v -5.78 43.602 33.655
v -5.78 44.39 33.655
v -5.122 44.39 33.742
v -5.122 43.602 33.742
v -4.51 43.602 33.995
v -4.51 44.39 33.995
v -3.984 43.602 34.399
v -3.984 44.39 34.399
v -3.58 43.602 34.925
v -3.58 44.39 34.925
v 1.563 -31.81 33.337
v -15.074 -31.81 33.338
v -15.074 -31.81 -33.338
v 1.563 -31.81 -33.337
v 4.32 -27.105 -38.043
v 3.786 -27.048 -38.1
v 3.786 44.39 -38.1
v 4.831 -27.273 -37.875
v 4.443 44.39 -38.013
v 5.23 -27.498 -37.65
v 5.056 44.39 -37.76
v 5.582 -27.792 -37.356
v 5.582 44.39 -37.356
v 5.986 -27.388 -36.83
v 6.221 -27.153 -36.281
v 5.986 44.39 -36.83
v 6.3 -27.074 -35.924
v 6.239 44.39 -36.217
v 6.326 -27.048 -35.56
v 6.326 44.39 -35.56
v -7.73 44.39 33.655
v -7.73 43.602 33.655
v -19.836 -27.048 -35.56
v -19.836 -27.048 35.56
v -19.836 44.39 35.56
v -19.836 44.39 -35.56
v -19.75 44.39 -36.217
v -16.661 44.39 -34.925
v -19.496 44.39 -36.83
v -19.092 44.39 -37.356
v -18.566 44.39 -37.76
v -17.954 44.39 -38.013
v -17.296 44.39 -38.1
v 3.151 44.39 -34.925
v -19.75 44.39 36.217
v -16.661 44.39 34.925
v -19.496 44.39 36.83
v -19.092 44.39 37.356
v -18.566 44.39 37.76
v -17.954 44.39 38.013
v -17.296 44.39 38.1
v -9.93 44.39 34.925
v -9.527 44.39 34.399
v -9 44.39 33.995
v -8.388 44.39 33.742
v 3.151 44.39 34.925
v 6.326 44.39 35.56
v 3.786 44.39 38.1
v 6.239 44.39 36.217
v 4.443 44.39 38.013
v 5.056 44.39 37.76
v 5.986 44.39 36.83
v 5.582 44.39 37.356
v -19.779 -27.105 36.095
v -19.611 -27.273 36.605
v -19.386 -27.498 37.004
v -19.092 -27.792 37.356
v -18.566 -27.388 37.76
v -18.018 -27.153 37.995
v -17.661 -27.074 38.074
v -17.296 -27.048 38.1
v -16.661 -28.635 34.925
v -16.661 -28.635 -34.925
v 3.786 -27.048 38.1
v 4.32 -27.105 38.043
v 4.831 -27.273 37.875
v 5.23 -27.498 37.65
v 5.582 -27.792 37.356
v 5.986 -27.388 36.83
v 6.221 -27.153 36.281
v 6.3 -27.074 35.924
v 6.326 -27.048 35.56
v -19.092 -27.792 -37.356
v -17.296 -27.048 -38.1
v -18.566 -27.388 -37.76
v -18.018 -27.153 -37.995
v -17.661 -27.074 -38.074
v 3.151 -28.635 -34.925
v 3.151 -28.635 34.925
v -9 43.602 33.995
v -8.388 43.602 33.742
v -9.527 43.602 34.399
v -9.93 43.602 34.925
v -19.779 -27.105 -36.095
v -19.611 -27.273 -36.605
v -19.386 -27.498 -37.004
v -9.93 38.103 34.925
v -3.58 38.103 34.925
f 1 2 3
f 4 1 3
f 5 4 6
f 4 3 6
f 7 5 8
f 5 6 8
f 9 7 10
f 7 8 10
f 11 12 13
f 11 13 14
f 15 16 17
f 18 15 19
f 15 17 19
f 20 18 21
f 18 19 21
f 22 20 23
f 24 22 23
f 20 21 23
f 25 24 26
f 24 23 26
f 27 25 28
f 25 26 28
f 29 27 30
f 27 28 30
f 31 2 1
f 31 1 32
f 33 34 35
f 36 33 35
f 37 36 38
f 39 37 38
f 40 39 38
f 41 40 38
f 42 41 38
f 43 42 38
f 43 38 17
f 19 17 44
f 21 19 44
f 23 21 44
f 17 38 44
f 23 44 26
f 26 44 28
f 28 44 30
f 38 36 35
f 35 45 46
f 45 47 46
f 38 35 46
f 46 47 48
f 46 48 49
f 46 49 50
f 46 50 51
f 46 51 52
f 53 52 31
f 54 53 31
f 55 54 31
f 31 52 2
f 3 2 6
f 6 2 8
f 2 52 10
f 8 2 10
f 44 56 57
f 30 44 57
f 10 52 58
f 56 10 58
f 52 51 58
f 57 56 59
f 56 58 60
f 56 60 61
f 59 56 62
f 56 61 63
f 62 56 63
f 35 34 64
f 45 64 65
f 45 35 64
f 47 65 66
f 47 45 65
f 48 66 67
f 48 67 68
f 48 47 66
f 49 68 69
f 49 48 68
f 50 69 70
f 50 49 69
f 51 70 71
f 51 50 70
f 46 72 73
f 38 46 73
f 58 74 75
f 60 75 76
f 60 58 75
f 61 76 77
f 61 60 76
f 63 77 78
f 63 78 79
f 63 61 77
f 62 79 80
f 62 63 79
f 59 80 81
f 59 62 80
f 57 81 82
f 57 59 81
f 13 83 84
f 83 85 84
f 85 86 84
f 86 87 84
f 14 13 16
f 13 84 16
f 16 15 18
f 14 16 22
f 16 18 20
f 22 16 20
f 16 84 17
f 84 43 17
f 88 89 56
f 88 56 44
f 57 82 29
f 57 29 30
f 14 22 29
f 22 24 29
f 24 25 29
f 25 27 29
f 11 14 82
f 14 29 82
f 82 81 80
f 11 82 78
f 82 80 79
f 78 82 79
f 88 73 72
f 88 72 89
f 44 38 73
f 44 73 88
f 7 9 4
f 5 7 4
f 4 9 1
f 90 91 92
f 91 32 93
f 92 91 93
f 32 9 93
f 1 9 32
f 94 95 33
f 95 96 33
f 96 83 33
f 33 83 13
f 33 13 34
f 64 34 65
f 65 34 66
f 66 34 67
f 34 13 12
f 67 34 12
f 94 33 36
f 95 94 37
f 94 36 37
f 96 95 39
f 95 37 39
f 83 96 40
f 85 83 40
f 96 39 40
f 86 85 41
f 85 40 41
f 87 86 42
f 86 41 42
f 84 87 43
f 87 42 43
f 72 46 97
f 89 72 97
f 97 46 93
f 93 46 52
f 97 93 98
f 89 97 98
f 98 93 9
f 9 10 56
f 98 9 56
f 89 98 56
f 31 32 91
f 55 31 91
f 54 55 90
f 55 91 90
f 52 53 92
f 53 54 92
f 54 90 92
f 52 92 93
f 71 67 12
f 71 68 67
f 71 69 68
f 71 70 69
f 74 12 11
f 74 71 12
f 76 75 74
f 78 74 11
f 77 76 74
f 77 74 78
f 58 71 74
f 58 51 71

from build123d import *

# Parameters (mm, degrees)
SKETCH1_W           = 26.162
SKETCH1_H           = 76.2
BOSS_EXTRUDE1_DEPTH = 38.1
SKETCH2_W           = 19.812
SKETCH2_H           = 69.85
CUT_EXTRUDE1_DEPTH  = 73.025
CHAMFER1_SIZE       = 4.7625
SKETCH3_W           = 6.35
SKETCH3_H           = 0.7874
BOSS_EXTRUDE2_DEPTH = 1.27
FILLET1_R           = 2.54
FILLET2_R           = 2.54


with BuildPart() as part:
    # Sketch1 → Boss-Extrude1 (new, symmetric)
    with BuildSketch(Plane.XY):
        with Locations((-6.755190476, 6.28952381)):
            Rectangle(SKETCH1_W, SKETCH1_H)
    extrude(amount=BOSS_EXTRUDE1_DEPTH, both=True)

    # Sketch2 → Cut-Extrude1 (cut)
    with BuildSketch(Plane(origin=(0, 44.38952381, 0), x_dir=(1, 0, 0), z_dir=(0, 1, 0))):
        with Locations((-6.755190476, 0)):
            Rectangle(SKETCH2_W, SKETCH2_H)
    extrude(amount=-CUT_EXTRUDE1_DEPTH, mode=Mode.SUBTRACT)

    # Chamfer1
    chamfer1_edges = [part.edges().sort_by_distance(p)[0] for p in [
        (-6.755190476, -31.81047619, 38.1),
        (-6.755190476, -31.81047619, -38.1),
        (6.325809524, -31.81047619, 0),
        (-19.836190476, -31.81047619, 0),
    ]]
    chamfer(chamfer1_edges, length=CHAMFER1_SIZE)

    # Sketch3 → Boss-Extrude2 (add)
    with BuildSketch(Plane(origin=(0, 0, 34.925), x_dir=(-1, 0, 0), z_dir=(0, 0, -1))):
        with Locations((6.755190476, 43.99582381)):
            Rectangle(SKETCH3_W, SKETCH3_H)
    extrude(amount=BOSS_EXTRUDE2_DEPTH)

    # Fillet1
    fillet1_edges = [part.edges().sort_by_distance(p)[0] for p in [
        (6.325809524, 8.67077381, -38.1),
        (6.325809524, 8.67077381, 38.1),
        (-19.836190476, 8.67077381, -38.1),
        (-19.836190476, 8.67077381, 38.1),
    ]]
    fillet(fillet1_edges, radius=FILLET1_R)

    # Fillet2
    # the kernel refuses this fillet: 2.54 mm, written as the material it takes off along each edge
    with BuildSketch(Plane(origin=(-3.580190476, 49.888785124, 33.655), x_dir=(0, 0, 1), z_dir=(0, -1, 0))) as fillet2_piece_1:
        with BuildLine():
            CenterArc((2.54, 2.199704526), FILLET2_R, 180, 60)
            Line((0, 2.199704526), (-0.0508, 2.199704526))
            Line((-0.0508, 2.199704526), (-0.0508, 0))
            Line((-0.0508, 0), (0, -0.0508))
            ThreePointArc((0, -0.0508), (0.635, -0.0508), (1.2446, -0.043994091))
            Line((1.2446, -0.043994091), (1.27, 0))
        make_face()
    extrude(amount=11.785922628, mode=Mode.SUBTRACT)
    with BuildSketch(Plane(origin=(-9.930190476, 38.102862495, 33.655), x_dir=(1, 0, 0), z_dir=(0, 1, 0))) as fillet2_piece_2:
        with BuildLine():
            CenterArc((2.199704526, -2.54), FILLET2_R, 90, 60)
            Line((0, -1.27), (-0.043994091, -1.2446))
            ThreePointArc((-0.043994091, -1.2446), (-0.0508, -0.635), (-0.0508, 0))
            Line((-0.0508, 0), (0, 0.0508))
            Line((0, 0.0508), (2.199704526, 0.0508))
            Line((2.199704526, 0.0508), (2.199704526, 0))
        make_face()
    extrude(amount=11.785922628, mode=Mode.SUBTRACT)


solid = part.part
